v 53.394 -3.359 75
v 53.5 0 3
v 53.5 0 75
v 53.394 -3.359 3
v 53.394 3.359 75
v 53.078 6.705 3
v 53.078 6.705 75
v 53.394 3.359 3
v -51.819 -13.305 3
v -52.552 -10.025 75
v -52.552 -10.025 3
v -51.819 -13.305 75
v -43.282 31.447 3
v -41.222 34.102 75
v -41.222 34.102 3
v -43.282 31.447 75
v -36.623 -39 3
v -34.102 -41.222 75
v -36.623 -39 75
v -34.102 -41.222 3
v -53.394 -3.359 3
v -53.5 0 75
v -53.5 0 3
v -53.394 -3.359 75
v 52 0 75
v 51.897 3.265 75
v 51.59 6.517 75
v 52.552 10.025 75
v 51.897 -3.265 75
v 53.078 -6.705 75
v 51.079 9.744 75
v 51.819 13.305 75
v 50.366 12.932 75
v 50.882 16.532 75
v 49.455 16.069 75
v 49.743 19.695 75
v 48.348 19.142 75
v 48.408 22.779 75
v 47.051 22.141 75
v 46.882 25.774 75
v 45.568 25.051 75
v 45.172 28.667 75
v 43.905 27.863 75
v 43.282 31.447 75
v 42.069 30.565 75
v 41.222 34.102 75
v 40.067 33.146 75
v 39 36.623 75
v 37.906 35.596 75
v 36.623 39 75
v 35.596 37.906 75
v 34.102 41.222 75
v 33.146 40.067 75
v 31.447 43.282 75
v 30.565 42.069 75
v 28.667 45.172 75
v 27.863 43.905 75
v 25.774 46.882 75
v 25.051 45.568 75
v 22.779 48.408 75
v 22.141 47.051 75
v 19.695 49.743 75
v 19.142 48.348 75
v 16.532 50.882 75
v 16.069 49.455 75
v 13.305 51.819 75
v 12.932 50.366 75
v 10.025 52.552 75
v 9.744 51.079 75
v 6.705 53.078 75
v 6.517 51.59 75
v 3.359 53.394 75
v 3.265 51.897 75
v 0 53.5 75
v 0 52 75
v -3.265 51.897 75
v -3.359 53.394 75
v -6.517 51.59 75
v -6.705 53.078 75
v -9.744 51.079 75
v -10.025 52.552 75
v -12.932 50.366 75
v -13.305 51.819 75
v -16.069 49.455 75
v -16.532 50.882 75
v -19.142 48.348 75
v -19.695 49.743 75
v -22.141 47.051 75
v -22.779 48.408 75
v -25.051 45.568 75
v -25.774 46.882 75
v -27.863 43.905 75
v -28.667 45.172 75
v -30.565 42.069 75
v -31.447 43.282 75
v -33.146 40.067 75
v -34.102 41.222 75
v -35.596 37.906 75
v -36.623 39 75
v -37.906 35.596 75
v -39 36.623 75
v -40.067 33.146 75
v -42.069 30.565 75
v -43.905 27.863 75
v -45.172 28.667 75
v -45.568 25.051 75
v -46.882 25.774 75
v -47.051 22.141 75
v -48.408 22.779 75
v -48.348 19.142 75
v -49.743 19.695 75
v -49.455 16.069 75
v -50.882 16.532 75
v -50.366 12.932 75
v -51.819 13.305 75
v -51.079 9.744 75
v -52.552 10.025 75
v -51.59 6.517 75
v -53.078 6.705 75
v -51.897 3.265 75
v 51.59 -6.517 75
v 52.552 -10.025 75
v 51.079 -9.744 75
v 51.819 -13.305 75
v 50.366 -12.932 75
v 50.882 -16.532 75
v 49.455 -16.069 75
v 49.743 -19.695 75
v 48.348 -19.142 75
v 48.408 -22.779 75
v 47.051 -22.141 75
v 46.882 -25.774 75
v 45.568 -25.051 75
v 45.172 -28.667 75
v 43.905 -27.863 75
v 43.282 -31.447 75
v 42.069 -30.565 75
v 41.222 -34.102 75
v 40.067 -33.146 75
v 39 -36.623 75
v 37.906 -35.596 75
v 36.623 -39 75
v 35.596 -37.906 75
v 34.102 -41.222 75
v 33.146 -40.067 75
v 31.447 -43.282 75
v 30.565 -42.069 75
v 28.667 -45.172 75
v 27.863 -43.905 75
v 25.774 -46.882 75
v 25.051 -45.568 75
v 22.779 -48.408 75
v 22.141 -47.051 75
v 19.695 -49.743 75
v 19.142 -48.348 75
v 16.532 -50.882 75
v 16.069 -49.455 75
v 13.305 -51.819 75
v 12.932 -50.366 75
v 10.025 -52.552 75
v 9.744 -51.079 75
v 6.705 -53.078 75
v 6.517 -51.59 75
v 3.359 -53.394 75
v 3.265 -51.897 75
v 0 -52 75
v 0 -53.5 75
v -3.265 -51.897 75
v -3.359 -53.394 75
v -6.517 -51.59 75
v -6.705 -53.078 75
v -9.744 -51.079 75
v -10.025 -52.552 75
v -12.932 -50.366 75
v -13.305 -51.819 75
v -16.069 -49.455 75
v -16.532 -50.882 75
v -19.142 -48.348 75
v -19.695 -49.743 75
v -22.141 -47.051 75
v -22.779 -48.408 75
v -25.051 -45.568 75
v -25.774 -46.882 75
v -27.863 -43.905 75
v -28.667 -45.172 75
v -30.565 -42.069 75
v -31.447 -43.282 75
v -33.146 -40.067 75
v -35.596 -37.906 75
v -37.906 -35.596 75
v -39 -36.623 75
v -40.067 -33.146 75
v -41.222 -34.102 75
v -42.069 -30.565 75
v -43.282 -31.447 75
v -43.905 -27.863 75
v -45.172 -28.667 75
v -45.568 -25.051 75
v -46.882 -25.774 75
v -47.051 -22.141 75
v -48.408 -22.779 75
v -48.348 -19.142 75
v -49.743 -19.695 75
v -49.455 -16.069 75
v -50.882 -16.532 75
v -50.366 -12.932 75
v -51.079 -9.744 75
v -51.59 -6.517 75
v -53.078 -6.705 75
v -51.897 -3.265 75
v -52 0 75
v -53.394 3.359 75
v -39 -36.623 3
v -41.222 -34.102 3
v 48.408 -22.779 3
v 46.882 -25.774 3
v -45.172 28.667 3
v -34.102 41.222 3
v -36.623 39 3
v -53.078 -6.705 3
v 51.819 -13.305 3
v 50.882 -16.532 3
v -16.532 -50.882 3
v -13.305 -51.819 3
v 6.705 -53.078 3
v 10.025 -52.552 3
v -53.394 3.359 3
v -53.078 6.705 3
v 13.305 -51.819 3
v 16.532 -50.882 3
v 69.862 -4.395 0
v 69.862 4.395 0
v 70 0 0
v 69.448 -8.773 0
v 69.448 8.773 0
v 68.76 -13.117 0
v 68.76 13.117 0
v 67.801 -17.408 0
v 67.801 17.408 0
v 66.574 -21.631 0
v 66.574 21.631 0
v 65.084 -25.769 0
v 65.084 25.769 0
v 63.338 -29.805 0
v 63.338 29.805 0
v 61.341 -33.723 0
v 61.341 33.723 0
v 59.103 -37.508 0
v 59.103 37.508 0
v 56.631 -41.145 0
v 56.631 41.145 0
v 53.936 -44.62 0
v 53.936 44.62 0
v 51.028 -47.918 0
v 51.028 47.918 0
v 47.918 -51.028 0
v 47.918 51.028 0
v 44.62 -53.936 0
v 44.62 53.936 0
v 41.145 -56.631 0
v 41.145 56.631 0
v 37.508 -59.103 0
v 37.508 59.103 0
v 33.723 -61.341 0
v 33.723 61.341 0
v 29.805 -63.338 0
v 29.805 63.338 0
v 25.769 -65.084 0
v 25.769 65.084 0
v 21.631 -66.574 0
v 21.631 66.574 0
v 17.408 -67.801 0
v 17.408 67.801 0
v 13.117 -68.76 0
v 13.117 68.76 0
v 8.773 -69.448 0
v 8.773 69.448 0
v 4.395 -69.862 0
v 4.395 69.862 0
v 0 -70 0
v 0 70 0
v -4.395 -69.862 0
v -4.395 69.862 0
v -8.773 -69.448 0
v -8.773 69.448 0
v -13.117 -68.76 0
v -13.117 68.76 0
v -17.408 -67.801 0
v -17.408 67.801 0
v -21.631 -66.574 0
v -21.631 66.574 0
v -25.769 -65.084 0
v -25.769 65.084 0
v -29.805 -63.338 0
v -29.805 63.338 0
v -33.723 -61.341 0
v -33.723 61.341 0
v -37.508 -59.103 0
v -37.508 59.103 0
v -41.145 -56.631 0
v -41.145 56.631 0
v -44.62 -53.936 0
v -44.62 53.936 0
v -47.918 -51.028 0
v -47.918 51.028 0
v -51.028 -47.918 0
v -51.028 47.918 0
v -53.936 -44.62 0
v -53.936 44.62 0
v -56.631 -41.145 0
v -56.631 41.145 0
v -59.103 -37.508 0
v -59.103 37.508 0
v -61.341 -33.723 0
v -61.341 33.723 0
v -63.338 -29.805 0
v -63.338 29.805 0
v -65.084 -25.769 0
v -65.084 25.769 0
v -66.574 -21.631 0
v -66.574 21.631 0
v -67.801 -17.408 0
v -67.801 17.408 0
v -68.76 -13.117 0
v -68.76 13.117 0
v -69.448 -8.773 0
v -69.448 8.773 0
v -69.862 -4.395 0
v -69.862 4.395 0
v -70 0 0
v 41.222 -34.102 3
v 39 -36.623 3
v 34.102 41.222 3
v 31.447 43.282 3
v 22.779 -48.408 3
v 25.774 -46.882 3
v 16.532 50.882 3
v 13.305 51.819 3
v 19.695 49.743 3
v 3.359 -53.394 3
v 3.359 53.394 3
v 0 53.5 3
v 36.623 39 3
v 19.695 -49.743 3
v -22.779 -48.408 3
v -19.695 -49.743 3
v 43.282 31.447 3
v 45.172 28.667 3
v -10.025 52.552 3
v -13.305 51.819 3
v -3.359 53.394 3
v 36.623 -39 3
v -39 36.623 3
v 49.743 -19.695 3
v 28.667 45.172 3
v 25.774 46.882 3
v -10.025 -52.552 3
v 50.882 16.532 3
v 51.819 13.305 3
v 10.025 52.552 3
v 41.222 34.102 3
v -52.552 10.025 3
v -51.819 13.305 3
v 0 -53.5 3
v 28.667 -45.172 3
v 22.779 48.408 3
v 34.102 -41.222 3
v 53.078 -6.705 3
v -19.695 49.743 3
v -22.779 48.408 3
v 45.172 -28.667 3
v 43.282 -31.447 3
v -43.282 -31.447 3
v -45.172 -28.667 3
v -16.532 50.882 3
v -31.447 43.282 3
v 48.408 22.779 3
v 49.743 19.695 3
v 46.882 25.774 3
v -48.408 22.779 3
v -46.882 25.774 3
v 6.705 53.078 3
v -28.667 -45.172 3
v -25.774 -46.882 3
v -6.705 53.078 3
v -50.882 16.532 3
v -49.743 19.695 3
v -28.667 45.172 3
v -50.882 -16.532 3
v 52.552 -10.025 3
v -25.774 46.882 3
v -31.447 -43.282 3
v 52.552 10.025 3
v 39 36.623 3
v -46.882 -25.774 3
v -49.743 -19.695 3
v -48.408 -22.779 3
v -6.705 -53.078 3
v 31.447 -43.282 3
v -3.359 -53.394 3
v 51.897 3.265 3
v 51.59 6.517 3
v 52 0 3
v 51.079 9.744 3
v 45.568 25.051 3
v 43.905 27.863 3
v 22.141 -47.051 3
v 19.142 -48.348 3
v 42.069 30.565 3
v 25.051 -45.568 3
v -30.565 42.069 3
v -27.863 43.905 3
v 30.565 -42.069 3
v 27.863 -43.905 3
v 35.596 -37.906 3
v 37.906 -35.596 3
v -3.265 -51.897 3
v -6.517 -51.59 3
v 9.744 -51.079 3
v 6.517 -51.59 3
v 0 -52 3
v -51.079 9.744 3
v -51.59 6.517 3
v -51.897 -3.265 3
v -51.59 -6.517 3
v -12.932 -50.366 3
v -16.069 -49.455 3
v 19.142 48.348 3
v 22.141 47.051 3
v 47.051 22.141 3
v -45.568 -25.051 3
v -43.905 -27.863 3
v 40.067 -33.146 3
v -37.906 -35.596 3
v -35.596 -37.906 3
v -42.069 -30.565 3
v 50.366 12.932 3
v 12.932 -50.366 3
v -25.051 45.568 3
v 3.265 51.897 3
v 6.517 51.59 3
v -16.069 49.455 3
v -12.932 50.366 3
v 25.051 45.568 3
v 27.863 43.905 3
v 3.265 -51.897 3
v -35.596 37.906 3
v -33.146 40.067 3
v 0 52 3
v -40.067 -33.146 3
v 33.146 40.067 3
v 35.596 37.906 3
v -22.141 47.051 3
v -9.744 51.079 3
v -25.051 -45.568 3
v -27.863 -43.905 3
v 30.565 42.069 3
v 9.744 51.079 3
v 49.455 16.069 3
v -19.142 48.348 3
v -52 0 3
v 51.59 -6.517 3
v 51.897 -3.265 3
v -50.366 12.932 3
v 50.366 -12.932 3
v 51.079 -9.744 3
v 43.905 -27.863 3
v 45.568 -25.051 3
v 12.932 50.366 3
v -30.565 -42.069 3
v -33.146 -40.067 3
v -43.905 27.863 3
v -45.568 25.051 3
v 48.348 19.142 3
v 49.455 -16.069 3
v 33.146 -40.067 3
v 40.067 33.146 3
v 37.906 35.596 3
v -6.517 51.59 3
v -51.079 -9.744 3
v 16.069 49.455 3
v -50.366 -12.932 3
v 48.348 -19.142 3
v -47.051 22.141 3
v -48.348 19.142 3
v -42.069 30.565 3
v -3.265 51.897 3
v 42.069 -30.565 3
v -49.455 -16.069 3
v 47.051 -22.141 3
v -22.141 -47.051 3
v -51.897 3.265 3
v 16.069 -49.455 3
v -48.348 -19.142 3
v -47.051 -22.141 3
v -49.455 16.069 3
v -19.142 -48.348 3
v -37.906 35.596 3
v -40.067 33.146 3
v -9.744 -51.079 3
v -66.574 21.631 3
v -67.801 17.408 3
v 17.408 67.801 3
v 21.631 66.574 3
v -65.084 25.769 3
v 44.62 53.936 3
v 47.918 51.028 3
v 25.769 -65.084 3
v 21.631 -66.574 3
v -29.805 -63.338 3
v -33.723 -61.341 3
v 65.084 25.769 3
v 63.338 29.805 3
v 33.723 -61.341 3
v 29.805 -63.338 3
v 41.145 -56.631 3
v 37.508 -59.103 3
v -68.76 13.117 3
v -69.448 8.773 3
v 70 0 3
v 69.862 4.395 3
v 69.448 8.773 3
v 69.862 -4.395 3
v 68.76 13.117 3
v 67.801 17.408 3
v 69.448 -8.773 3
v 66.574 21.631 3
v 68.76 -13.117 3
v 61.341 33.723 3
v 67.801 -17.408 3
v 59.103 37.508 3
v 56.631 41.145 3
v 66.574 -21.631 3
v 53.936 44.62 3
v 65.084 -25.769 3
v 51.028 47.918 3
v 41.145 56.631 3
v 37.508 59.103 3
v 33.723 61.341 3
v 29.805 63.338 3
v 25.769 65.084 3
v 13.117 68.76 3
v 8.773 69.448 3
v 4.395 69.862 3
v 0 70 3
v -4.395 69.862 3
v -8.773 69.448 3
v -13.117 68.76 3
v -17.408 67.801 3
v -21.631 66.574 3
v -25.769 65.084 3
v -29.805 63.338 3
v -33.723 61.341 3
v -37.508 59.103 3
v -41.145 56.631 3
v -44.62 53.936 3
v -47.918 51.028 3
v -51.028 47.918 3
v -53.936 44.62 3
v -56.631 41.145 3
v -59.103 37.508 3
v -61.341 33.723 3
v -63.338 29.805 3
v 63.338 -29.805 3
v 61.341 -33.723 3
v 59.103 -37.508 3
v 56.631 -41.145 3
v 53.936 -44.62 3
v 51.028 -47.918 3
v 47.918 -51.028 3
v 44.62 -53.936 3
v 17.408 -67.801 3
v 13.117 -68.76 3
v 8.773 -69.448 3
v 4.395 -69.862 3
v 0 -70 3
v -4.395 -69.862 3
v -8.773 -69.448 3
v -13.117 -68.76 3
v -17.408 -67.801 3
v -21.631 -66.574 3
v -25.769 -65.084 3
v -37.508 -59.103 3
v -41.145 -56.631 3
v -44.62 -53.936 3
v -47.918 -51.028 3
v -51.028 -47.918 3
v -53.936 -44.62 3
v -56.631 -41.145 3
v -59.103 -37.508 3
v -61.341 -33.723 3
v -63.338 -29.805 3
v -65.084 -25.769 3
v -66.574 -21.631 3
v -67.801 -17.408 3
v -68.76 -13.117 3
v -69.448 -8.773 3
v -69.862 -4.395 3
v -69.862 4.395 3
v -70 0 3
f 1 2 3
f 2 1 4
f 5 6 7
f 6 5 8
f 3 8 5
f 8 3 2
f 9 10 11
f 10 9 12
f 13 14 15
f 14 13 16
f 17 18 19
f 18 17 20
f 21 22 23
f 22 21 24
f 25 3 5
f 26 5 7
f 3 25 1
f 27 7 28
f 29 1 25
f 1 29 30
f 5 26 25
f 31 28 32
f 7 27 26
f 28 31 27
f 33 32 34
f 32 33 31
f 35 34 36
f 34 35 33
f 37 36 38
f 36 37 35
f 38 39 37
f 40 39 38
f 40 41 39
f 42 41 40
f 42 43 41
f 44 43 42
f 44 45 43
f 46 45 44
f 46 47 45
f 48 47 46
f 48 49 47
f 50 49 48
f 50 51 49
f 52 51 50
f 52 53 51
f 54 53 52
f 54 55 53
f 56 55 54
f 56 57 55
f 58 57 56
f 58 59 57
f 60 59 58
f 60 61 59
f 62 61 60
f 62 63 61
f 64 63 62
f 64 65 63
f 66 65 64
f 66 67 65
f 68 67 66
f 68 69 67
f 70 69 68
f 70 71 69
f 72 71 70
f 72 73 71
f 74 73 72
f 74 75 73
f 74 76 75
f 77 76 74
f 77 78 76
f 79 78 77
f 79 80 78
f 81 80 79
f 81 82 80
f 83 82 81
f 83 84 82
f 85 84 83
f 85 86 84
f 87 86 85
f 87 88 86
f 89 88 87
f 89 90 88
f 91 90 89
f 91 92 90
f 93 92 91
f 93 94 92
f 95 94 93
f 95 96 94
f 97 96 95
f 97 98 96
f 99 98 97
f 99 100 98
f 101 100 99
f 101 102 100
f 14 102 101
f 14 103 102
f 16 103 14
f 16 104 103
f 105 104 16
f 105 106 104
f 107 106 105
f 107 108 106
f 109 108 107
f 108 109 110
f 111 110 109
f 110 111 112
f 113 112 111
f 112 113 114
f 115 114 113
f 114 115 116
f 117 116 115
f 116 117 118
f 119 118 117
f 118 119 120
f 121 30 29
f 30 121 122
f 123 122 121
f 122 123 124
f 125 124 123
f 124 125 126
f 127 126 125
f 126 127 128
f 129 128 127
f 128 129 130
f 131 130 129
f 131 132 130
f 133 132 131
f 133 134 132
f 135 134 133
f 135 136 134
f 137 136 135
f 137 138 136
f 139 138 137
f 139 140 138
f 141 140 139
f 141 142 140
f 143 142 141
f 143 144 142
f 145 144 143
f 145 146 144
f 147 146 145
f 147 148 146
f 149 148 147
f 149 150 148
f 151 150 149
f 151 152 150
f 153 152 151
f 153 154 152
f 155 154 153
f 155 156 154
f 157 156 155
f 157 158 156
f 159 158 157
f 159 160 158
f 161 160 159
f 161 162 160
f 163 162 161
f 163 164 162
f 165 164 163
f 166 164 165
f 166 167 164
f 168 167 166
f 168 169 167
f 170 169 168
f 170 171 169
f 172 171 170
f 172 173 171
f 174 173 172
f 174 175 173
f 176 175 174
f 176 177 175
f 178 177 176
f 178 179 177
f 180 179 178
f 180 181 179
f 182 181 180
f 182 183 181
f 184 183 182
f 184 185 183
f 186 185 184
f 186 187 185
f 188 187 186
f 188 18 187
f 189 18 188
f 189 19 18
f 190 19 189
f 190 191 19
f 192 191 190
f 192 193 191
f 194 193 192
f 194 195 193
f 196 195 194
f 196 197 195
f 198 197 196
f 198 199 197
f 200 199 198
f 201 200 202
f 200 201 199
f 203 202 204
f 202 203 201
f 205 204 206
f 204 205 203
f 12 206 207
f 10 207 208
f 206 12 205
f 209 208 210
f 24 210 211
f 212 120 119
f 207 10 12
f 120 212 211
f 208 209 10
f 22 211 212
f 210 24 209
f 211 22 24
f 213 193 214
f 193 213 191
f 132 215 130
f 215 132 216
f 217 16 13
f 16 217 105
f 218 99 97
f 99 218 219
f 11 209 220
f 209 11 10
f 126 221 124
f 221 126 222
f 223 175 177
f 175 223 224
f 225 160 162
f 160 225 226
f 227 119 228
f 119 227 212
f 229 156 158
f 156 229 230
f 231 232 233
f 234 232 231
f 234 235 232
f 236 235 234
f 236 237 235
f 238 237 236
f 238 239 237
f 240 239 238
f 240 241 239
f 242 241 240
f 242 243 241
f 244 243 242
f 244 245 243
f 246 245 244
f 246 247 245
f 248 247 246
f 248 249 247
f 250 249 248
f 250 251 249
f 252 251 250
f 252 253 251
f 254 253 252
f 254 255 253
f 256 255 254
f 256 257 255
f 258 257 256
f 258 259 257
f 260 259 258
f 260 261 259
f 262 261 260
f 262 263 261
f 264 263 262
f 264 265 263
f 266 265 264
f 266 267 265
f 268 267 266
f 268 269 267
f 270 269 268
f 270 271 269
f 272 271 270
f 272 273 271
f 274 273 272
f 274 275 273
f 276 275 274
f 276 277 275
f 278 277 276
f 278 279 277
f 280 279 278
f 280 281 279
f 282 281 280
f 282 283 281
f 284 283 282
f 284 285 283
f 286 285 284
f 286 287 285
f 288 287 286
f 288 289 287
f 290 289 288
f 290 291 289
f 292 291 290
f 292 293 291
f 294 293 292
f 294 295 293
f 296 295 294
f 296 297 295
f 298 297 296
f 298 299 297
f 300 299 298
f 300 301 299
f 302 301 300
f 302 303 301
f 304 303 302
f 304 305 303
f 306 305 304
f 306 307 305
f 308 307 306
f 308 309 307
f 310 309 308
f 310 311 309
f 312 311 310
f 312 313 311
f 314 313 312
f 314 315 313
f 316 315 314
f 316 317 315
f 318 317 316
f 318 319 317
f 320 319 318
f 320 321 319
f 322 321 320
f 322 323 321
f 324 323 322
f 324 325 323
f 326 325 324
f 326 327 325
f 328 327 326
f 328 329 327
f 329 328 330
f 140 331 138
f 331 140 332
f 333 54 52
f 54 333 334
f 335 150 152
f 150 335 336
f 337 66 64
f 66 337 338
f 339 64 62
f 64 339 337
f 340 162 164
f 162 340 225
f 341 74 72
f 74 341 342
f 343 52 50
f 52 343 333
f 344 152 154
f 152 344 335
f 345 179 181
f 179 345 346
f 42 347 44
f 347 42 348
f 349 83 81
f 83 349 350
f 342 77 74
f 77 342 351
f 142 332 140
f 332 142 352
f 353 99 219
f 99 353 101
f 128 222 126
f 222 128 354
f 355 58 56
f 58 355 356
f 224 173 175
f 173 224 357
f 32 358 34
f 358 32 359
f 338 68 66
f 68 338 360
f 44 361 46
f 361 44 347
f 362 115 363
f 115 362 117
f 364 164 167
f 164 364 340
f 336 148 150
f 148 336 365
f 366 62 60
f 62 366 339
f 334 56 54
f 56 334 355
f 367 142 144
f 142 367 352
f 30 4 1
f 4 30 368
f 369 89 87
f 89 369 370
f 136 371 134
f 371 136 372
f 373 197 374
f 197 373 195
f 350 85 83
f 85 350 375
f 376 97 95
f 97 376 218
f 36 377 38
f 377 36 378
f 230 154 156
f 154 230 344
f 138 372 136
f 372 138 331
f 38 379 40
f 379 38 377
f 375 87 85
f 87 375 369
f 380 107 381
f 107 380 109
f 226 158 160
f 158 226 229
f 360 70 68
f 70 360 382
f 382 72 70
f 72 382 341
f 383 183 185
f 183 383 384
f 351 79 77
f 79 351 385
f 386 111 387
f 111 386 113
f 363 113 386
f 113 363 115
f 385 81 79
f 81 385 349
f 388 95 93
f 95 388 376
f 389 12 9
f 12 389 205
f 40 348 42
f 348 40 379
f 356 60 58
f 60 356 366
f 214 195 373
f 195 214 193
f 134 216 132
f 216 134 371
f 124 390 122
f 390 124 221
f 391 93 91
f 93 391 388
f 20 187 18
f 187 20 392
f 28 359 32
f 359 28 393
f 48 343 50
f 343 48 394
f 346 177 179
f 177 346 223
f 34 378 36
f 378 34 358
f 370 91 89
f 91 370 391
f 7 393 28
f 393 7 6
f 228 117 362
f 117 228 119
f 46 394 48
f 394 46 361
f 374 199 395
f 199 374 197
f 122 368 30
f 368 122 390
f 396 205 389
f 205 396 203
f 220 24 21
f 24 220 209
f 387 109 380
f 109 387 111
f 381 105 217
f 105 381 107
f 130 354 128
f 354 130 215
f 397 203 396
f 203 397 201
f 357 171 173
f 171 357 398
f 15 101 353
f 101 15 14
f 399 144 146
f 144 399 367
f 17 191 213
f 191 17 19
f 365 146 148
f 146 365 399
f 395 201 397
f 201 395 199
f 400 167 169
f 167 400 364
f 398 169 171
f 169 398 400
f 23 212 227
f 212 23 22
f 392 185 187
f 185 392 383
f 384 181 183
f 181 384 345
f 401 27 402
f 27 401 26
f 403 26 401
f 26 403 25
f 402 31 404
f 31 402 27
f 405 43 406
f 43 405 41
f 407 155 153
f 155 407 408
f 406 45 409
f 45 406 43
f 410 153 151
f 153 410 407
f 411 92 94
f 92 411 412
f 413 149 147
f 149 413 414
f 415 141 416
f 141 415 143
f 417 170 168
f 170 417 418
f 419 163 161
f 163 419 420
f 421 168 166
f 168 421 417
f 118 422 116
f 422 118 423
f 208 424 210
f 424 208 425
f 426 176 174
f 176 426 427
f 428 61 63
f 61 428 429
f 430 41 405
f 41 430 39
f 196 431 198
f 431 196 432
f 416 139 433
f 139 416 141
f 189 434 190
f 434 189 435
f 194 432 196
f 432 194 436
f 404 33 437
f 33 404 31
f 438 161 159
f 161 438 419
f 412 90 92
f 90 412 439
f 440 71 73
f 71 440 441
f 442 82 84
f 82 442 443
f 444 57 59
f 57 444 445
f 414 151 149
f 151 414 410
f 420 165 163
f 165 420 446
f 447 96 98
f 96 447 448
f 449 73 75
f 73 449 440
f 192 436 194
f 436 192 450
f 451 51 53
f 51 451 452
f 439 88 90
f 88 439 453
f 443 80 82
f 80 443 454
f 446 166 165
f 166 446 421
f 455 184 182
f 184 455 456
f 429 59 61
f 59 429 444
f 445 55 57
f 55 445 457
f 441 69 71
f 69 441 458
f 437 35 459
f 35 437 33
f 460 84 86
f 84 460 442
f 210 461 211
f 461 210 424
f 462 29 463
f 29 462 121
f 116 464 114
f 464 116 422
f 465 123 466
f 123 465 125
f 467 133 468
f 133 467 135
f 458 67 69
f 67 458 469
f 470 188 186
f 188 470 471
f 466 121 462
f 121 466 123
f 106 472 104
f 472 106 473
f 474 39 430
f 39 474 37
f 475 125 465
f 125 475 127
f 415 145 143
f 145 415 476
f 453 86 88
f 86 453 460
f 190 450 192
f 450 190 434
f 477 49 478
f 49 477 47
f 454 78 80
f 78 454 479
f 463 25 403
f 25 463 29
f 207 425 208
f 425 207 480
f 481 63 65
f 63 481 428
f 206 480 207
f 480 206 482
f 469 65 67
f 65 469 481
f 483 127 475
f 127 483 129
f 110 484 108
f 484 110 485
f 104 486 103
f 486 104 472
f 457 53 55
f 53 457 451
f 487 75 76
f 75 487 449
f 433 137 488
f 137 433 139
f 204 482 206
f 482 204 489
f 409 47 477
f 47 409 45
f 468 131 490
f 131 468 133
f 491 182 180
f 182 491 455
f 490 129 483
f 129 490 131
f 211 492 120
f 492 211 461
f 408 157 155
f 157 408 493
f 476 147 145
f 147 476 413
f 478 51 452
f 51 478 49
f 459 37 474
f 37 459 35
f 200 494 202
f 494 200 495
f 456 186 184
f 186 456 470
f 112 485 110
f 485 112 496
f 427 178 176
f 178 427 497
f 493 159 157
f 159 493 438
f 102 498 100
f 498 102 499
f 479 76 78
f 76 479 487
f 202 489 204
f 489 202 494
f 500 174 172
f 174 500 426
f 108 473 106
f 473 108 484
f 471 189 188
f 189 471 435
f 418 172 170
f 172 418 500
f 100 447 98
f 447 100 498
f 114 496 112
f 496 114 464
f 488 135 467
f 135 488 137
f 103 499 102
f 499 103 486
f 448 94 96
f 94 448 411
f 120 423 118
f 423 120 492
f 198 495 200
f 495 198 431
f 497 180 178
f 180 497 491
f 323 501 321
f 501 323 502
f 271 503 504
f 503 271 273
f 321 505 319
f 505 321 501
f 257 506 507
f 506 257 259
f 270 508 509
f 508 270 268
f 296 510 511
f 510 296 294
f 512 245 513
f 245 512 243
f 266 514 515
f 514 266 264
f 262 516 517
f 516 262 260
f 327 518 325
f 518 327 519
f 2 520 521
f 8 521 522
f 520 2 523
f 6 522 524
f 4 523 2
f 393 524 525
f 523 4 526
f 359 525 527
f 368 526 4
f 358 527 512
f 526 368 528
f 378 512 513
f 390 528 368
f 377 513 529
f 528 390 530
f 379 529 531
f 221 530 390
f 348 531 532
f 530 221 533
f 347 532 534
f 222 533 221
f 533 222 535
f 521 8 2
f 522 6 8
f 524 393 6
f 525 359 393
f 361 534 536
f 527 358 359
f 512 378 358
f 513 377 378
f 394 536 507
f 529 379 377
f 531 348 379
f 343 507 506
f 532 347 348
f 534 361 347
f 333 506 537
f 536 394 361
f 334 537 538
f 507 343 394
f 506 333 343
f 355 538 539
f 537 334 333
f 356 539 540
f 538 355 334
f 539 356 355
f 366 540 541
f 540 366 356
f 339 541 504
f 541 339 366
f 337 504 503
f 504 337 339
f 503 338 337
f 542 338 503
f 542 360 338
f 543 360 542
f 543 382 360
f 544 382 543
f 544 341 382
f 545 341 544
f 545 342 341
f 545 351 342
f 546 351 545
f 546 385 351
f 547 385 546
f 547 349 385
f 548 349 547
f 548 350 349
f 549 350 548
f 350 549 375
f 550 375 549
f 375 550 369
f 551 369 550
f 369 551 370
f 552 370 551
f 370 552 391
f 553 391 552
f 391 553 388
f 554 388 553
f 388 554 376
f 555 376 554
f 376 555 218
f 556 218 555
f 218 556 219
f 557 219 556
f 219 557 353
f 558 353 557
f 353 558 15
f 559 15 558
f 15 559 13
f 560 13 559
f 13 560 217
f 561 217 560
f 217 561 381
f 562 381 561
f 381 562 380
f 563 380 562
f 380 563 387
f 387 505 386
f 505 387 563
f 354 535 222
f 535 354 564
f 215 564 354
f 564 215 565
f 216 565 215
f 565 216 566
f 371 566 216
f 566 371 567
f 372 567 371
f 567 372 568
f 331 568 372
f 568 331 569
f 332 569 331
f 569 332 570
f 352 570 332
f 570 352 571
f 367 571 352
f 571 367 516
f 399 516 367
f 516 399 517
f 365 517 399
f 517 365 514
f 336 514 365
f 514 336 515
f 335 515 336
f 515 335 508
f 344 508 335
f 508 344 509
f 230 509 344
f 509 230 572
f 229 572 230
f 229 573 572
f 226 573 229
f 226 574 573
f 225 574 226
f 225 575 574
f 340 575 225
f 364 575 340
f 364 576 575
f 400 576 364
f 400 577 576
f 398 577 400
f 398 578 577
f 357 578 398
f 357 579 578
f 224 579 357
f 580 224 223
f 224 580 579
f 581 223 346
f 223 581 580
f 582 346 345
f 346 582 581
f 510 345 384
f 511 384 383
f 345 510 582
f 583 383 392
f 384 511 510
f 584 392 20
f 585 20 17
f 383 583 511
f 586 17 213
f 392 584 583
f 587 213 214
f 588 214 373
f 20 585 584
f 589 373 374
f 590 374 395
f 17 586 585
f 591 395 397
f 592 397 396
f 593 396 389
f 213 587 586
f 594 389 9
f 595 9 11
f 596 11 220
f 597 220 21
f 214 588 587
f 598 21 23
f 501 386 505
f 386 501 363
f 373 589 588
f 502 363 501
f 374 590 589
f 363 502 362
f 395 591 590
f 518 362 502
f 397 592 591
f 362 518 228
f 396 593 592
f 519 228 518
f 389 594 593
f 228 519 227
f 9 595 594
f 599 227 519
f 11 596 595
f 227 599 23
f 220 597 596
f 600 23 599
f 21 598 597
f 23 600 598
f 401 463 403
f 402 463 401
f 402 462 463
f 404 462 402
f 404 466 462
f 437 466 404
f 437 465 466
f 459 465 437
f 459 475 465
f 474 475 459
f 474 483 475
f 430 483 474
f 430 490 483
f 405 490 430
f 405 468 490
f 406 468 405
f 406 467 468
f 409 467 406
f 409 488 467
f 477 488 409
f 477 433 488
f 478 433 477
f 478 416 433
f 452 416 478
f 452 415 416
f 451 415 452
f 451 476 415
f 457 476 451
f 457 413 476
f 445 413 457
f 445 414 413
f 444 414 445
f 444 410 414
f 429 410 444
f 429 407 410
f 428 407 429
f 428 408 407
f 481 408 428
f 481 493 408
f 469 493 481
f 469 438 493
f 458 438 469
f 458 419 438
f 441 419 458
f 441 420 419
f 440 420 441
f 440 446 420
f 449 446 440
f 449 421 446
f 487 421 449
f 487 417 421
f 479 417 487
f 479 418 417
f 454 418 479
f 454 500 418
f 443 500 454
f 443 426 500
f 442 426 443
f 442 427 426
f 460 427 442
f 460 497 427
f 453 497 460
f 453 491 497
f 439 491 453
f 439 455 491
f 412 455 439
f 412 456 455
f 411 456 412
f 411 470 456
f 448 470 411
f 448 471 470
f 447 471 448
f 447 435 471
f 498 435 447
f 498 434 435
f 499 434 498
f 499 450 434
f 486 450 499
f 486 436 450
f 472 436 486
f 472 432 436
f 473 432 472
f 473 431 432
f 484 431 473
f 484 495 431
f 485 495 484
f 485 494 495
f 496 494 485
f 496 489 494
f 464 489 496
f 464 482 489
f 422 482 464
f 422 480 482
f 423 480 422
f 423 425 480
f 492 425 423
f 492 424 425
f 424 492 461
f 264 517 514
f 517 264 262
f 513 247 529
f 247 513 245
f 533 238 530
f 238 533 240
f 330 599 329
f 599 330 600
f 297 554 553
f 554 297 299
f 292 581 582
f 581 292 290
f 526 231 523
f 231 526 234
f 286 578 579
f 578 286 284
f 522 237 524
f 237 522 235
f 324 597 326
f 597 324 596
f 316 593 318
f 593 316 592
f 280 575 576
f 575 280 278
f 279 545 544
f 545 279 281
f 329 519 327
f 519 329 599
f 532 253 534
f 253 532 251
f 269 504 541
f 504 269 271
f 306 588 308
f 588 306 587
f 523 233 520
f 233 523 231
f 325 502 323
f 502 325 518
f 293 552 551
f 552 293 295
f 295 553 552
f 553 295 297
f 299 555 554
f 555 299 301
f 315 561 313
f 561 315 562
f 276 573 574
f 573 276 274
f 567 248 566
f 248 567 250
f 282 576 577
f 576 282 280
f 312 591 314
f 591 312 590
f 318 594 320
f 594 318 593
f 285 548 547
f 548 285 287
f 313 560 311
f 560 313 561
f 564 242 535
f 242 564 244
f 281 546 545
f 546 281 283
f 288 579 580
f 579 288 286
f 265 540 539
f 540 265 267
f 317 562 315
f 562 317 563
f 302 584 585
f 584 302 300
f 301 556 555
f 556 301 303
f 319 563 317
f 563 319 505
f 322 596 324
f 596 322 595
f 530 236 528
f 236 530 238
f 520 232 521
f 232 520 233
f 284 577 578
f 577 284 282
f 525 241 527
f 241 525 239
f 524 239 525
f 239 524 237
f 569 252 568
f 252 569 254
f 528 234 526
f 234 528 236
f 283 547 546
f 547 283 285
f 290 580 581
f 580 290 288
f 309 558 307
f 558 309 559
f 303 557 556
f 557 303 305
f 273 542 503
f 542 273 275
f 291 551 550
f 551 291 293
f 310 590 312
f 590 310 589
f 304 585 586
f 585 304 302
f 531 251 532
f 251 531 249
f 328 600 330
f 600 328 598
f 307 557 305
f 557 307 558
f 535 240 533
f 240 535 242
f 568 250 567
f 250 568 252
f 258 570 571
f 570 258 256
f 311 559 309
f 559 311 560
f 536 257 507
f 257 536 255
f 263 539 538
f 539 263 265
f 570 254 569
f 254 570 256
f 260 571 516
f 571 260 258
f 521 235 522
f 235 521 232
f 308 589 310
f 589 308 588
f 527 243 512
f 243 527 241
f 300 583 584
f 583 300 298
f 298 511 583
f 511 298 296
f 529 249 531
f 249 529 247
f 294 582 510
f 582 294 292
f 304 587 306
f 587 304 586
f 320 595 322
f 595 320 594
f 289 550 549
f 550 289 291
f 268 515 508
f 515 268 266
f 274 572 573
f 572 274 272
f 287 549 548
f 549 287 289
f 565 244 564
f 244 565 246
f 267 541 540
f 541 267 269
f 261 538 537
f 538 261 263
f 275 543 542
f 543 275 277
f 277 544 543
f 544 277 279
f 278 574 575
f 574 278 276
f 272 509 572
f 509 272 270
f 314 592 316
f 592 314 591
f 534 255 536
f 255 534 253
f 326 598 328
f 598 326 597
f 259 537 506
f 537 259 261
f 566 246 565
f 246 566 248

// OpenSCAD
//hose cover / poklop na trubku

insideVert=107;
insideVertR=insideVert/2;
coverHoriz=140;

inside_z=75;
thick=3;
$fn=100;

module VerticalR(){
    difference(){
        cylinder(h = inside_z, r = insideVertR);
        cylinder(h = inside_z+1, r = insideVertR-thick/2);
    }
}

module HorizontalCover(){
    rotate_extrude() {
        square(size=[coverHoriz/2,thick]);
    }
}



VerticalR();
HorizontalCover();
